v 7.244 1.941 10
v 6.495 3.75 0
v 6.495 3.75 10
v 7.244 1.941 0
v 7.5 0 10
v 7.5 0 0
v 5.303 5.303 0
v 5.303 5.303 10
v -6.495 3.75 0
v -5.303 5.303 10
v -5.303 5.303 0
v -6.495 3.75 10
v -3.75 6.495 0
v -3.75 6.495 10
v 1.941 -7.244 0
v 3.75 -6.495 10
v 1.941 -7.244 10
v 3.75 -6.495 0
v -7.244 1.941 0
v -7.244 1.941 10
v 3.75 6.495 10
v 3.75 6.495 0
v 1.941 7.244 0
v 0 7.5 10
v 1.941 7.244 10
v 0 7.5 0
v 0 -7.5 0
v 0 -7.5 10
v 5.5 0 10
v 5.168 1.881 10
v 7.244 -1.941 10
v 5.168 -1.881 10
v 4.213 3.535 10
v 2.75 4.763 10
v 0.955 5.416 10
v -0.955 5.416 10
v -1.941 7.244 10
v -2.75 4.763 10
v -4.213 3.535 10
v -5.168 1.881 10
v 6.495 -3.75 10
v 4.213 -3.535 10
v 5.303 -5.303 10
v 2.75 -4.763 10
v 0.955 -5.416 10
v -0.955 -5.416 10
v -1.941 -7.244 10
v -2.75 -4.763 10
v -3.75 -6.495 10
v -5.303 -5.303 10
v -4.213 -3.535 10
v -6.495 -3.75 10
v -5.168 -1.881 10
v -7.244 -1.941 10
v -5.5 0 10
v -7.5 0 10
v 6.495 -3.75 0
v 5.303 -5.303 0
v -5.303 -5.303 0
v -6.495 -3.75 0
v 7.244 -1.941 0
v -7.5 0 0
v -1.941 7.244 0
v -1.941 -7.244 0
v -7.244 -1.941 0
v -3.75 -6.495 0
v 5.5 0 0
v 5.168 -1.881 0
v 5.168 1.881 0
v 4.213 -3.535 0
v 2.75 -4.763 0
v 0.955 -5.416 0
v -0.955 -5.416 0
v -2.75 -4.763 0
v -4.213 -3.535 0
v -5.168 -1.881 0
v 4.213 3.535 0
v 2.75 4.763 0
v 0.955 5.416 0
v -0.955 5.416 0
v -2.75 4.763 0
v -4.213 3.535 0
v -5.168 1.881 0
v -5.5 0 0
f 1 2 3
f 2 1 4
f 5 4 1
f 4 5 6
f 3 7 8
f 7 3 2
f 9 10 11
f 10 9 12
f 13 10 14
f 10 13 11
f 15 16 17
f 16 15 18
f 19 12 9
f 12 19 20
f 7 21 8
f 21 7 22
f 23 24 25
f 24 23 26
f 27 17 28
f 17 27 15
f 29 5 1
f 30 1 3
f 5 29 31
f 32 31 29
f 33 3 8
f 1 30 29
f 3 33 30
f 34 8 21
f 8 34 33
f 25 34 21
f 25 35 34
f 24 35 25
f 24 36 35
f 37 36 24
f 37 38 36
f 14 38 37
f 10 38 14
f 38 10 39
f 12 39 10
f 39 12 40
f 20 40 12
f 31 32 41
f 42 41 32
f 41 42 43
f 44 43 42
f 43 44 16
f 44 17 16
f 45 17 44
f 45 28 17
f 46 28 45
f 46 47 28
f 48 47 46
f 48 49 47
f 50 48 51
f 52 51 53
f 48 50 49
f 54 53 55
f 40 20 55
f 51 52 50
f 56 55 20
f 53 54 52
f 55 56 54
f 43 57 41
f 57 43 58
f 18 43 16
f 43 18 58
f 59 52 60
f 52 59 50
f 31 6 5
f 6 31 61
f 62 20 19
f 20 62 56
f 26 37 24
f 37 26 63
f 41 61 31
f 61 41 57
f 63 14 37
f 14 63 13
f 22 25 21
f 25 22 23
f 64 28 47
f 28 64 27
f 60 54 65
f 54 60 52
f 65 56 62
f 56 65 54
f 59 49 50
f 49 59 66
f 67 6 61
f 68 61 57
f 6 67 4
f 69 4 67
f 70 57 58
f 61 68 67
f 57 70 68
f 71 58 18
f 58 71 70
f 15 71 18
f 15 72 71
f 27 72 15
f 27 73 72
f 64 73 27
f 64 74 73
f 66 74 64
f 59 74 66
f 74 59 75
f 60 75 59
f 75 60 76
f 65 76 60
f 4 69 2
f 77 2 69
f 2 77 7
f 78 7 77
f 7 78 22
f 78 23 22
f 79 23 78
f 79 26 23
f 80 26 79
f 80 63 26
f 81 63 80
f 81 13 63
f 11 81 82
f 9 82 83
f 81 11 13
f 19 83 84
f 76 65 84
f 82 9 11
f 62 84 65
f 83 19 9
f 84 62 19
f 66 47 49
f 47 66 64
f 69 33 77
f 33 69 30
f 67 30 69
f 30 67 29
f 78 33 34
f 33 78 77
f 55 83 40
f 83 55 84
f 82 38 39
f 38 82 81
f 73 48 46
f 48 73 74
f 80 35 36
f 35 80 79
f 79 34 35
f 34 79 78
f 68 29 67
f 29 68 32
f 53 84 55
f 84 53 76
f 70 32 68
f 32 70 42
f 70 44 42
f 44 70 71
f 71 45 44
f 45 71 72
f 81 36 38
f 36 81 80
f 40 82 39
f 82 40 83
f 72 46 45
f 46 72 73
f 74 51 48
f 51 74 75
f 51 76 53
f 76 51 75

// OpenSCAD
magRadius = 5;

shaftHeight = 10;
shaftThickness = 2;
shaftGlide = 0.5;

module shaft() {
  innerH = magRadius + shaftGlide;
  difference() {
    cylinder(h = shaftHeight, r = innerH + shaftThickness);
    translate([0,0,-0.1])
      cylinder(h = shaftHeight + 0.2, r = innerH);
  }
}

shaft();
